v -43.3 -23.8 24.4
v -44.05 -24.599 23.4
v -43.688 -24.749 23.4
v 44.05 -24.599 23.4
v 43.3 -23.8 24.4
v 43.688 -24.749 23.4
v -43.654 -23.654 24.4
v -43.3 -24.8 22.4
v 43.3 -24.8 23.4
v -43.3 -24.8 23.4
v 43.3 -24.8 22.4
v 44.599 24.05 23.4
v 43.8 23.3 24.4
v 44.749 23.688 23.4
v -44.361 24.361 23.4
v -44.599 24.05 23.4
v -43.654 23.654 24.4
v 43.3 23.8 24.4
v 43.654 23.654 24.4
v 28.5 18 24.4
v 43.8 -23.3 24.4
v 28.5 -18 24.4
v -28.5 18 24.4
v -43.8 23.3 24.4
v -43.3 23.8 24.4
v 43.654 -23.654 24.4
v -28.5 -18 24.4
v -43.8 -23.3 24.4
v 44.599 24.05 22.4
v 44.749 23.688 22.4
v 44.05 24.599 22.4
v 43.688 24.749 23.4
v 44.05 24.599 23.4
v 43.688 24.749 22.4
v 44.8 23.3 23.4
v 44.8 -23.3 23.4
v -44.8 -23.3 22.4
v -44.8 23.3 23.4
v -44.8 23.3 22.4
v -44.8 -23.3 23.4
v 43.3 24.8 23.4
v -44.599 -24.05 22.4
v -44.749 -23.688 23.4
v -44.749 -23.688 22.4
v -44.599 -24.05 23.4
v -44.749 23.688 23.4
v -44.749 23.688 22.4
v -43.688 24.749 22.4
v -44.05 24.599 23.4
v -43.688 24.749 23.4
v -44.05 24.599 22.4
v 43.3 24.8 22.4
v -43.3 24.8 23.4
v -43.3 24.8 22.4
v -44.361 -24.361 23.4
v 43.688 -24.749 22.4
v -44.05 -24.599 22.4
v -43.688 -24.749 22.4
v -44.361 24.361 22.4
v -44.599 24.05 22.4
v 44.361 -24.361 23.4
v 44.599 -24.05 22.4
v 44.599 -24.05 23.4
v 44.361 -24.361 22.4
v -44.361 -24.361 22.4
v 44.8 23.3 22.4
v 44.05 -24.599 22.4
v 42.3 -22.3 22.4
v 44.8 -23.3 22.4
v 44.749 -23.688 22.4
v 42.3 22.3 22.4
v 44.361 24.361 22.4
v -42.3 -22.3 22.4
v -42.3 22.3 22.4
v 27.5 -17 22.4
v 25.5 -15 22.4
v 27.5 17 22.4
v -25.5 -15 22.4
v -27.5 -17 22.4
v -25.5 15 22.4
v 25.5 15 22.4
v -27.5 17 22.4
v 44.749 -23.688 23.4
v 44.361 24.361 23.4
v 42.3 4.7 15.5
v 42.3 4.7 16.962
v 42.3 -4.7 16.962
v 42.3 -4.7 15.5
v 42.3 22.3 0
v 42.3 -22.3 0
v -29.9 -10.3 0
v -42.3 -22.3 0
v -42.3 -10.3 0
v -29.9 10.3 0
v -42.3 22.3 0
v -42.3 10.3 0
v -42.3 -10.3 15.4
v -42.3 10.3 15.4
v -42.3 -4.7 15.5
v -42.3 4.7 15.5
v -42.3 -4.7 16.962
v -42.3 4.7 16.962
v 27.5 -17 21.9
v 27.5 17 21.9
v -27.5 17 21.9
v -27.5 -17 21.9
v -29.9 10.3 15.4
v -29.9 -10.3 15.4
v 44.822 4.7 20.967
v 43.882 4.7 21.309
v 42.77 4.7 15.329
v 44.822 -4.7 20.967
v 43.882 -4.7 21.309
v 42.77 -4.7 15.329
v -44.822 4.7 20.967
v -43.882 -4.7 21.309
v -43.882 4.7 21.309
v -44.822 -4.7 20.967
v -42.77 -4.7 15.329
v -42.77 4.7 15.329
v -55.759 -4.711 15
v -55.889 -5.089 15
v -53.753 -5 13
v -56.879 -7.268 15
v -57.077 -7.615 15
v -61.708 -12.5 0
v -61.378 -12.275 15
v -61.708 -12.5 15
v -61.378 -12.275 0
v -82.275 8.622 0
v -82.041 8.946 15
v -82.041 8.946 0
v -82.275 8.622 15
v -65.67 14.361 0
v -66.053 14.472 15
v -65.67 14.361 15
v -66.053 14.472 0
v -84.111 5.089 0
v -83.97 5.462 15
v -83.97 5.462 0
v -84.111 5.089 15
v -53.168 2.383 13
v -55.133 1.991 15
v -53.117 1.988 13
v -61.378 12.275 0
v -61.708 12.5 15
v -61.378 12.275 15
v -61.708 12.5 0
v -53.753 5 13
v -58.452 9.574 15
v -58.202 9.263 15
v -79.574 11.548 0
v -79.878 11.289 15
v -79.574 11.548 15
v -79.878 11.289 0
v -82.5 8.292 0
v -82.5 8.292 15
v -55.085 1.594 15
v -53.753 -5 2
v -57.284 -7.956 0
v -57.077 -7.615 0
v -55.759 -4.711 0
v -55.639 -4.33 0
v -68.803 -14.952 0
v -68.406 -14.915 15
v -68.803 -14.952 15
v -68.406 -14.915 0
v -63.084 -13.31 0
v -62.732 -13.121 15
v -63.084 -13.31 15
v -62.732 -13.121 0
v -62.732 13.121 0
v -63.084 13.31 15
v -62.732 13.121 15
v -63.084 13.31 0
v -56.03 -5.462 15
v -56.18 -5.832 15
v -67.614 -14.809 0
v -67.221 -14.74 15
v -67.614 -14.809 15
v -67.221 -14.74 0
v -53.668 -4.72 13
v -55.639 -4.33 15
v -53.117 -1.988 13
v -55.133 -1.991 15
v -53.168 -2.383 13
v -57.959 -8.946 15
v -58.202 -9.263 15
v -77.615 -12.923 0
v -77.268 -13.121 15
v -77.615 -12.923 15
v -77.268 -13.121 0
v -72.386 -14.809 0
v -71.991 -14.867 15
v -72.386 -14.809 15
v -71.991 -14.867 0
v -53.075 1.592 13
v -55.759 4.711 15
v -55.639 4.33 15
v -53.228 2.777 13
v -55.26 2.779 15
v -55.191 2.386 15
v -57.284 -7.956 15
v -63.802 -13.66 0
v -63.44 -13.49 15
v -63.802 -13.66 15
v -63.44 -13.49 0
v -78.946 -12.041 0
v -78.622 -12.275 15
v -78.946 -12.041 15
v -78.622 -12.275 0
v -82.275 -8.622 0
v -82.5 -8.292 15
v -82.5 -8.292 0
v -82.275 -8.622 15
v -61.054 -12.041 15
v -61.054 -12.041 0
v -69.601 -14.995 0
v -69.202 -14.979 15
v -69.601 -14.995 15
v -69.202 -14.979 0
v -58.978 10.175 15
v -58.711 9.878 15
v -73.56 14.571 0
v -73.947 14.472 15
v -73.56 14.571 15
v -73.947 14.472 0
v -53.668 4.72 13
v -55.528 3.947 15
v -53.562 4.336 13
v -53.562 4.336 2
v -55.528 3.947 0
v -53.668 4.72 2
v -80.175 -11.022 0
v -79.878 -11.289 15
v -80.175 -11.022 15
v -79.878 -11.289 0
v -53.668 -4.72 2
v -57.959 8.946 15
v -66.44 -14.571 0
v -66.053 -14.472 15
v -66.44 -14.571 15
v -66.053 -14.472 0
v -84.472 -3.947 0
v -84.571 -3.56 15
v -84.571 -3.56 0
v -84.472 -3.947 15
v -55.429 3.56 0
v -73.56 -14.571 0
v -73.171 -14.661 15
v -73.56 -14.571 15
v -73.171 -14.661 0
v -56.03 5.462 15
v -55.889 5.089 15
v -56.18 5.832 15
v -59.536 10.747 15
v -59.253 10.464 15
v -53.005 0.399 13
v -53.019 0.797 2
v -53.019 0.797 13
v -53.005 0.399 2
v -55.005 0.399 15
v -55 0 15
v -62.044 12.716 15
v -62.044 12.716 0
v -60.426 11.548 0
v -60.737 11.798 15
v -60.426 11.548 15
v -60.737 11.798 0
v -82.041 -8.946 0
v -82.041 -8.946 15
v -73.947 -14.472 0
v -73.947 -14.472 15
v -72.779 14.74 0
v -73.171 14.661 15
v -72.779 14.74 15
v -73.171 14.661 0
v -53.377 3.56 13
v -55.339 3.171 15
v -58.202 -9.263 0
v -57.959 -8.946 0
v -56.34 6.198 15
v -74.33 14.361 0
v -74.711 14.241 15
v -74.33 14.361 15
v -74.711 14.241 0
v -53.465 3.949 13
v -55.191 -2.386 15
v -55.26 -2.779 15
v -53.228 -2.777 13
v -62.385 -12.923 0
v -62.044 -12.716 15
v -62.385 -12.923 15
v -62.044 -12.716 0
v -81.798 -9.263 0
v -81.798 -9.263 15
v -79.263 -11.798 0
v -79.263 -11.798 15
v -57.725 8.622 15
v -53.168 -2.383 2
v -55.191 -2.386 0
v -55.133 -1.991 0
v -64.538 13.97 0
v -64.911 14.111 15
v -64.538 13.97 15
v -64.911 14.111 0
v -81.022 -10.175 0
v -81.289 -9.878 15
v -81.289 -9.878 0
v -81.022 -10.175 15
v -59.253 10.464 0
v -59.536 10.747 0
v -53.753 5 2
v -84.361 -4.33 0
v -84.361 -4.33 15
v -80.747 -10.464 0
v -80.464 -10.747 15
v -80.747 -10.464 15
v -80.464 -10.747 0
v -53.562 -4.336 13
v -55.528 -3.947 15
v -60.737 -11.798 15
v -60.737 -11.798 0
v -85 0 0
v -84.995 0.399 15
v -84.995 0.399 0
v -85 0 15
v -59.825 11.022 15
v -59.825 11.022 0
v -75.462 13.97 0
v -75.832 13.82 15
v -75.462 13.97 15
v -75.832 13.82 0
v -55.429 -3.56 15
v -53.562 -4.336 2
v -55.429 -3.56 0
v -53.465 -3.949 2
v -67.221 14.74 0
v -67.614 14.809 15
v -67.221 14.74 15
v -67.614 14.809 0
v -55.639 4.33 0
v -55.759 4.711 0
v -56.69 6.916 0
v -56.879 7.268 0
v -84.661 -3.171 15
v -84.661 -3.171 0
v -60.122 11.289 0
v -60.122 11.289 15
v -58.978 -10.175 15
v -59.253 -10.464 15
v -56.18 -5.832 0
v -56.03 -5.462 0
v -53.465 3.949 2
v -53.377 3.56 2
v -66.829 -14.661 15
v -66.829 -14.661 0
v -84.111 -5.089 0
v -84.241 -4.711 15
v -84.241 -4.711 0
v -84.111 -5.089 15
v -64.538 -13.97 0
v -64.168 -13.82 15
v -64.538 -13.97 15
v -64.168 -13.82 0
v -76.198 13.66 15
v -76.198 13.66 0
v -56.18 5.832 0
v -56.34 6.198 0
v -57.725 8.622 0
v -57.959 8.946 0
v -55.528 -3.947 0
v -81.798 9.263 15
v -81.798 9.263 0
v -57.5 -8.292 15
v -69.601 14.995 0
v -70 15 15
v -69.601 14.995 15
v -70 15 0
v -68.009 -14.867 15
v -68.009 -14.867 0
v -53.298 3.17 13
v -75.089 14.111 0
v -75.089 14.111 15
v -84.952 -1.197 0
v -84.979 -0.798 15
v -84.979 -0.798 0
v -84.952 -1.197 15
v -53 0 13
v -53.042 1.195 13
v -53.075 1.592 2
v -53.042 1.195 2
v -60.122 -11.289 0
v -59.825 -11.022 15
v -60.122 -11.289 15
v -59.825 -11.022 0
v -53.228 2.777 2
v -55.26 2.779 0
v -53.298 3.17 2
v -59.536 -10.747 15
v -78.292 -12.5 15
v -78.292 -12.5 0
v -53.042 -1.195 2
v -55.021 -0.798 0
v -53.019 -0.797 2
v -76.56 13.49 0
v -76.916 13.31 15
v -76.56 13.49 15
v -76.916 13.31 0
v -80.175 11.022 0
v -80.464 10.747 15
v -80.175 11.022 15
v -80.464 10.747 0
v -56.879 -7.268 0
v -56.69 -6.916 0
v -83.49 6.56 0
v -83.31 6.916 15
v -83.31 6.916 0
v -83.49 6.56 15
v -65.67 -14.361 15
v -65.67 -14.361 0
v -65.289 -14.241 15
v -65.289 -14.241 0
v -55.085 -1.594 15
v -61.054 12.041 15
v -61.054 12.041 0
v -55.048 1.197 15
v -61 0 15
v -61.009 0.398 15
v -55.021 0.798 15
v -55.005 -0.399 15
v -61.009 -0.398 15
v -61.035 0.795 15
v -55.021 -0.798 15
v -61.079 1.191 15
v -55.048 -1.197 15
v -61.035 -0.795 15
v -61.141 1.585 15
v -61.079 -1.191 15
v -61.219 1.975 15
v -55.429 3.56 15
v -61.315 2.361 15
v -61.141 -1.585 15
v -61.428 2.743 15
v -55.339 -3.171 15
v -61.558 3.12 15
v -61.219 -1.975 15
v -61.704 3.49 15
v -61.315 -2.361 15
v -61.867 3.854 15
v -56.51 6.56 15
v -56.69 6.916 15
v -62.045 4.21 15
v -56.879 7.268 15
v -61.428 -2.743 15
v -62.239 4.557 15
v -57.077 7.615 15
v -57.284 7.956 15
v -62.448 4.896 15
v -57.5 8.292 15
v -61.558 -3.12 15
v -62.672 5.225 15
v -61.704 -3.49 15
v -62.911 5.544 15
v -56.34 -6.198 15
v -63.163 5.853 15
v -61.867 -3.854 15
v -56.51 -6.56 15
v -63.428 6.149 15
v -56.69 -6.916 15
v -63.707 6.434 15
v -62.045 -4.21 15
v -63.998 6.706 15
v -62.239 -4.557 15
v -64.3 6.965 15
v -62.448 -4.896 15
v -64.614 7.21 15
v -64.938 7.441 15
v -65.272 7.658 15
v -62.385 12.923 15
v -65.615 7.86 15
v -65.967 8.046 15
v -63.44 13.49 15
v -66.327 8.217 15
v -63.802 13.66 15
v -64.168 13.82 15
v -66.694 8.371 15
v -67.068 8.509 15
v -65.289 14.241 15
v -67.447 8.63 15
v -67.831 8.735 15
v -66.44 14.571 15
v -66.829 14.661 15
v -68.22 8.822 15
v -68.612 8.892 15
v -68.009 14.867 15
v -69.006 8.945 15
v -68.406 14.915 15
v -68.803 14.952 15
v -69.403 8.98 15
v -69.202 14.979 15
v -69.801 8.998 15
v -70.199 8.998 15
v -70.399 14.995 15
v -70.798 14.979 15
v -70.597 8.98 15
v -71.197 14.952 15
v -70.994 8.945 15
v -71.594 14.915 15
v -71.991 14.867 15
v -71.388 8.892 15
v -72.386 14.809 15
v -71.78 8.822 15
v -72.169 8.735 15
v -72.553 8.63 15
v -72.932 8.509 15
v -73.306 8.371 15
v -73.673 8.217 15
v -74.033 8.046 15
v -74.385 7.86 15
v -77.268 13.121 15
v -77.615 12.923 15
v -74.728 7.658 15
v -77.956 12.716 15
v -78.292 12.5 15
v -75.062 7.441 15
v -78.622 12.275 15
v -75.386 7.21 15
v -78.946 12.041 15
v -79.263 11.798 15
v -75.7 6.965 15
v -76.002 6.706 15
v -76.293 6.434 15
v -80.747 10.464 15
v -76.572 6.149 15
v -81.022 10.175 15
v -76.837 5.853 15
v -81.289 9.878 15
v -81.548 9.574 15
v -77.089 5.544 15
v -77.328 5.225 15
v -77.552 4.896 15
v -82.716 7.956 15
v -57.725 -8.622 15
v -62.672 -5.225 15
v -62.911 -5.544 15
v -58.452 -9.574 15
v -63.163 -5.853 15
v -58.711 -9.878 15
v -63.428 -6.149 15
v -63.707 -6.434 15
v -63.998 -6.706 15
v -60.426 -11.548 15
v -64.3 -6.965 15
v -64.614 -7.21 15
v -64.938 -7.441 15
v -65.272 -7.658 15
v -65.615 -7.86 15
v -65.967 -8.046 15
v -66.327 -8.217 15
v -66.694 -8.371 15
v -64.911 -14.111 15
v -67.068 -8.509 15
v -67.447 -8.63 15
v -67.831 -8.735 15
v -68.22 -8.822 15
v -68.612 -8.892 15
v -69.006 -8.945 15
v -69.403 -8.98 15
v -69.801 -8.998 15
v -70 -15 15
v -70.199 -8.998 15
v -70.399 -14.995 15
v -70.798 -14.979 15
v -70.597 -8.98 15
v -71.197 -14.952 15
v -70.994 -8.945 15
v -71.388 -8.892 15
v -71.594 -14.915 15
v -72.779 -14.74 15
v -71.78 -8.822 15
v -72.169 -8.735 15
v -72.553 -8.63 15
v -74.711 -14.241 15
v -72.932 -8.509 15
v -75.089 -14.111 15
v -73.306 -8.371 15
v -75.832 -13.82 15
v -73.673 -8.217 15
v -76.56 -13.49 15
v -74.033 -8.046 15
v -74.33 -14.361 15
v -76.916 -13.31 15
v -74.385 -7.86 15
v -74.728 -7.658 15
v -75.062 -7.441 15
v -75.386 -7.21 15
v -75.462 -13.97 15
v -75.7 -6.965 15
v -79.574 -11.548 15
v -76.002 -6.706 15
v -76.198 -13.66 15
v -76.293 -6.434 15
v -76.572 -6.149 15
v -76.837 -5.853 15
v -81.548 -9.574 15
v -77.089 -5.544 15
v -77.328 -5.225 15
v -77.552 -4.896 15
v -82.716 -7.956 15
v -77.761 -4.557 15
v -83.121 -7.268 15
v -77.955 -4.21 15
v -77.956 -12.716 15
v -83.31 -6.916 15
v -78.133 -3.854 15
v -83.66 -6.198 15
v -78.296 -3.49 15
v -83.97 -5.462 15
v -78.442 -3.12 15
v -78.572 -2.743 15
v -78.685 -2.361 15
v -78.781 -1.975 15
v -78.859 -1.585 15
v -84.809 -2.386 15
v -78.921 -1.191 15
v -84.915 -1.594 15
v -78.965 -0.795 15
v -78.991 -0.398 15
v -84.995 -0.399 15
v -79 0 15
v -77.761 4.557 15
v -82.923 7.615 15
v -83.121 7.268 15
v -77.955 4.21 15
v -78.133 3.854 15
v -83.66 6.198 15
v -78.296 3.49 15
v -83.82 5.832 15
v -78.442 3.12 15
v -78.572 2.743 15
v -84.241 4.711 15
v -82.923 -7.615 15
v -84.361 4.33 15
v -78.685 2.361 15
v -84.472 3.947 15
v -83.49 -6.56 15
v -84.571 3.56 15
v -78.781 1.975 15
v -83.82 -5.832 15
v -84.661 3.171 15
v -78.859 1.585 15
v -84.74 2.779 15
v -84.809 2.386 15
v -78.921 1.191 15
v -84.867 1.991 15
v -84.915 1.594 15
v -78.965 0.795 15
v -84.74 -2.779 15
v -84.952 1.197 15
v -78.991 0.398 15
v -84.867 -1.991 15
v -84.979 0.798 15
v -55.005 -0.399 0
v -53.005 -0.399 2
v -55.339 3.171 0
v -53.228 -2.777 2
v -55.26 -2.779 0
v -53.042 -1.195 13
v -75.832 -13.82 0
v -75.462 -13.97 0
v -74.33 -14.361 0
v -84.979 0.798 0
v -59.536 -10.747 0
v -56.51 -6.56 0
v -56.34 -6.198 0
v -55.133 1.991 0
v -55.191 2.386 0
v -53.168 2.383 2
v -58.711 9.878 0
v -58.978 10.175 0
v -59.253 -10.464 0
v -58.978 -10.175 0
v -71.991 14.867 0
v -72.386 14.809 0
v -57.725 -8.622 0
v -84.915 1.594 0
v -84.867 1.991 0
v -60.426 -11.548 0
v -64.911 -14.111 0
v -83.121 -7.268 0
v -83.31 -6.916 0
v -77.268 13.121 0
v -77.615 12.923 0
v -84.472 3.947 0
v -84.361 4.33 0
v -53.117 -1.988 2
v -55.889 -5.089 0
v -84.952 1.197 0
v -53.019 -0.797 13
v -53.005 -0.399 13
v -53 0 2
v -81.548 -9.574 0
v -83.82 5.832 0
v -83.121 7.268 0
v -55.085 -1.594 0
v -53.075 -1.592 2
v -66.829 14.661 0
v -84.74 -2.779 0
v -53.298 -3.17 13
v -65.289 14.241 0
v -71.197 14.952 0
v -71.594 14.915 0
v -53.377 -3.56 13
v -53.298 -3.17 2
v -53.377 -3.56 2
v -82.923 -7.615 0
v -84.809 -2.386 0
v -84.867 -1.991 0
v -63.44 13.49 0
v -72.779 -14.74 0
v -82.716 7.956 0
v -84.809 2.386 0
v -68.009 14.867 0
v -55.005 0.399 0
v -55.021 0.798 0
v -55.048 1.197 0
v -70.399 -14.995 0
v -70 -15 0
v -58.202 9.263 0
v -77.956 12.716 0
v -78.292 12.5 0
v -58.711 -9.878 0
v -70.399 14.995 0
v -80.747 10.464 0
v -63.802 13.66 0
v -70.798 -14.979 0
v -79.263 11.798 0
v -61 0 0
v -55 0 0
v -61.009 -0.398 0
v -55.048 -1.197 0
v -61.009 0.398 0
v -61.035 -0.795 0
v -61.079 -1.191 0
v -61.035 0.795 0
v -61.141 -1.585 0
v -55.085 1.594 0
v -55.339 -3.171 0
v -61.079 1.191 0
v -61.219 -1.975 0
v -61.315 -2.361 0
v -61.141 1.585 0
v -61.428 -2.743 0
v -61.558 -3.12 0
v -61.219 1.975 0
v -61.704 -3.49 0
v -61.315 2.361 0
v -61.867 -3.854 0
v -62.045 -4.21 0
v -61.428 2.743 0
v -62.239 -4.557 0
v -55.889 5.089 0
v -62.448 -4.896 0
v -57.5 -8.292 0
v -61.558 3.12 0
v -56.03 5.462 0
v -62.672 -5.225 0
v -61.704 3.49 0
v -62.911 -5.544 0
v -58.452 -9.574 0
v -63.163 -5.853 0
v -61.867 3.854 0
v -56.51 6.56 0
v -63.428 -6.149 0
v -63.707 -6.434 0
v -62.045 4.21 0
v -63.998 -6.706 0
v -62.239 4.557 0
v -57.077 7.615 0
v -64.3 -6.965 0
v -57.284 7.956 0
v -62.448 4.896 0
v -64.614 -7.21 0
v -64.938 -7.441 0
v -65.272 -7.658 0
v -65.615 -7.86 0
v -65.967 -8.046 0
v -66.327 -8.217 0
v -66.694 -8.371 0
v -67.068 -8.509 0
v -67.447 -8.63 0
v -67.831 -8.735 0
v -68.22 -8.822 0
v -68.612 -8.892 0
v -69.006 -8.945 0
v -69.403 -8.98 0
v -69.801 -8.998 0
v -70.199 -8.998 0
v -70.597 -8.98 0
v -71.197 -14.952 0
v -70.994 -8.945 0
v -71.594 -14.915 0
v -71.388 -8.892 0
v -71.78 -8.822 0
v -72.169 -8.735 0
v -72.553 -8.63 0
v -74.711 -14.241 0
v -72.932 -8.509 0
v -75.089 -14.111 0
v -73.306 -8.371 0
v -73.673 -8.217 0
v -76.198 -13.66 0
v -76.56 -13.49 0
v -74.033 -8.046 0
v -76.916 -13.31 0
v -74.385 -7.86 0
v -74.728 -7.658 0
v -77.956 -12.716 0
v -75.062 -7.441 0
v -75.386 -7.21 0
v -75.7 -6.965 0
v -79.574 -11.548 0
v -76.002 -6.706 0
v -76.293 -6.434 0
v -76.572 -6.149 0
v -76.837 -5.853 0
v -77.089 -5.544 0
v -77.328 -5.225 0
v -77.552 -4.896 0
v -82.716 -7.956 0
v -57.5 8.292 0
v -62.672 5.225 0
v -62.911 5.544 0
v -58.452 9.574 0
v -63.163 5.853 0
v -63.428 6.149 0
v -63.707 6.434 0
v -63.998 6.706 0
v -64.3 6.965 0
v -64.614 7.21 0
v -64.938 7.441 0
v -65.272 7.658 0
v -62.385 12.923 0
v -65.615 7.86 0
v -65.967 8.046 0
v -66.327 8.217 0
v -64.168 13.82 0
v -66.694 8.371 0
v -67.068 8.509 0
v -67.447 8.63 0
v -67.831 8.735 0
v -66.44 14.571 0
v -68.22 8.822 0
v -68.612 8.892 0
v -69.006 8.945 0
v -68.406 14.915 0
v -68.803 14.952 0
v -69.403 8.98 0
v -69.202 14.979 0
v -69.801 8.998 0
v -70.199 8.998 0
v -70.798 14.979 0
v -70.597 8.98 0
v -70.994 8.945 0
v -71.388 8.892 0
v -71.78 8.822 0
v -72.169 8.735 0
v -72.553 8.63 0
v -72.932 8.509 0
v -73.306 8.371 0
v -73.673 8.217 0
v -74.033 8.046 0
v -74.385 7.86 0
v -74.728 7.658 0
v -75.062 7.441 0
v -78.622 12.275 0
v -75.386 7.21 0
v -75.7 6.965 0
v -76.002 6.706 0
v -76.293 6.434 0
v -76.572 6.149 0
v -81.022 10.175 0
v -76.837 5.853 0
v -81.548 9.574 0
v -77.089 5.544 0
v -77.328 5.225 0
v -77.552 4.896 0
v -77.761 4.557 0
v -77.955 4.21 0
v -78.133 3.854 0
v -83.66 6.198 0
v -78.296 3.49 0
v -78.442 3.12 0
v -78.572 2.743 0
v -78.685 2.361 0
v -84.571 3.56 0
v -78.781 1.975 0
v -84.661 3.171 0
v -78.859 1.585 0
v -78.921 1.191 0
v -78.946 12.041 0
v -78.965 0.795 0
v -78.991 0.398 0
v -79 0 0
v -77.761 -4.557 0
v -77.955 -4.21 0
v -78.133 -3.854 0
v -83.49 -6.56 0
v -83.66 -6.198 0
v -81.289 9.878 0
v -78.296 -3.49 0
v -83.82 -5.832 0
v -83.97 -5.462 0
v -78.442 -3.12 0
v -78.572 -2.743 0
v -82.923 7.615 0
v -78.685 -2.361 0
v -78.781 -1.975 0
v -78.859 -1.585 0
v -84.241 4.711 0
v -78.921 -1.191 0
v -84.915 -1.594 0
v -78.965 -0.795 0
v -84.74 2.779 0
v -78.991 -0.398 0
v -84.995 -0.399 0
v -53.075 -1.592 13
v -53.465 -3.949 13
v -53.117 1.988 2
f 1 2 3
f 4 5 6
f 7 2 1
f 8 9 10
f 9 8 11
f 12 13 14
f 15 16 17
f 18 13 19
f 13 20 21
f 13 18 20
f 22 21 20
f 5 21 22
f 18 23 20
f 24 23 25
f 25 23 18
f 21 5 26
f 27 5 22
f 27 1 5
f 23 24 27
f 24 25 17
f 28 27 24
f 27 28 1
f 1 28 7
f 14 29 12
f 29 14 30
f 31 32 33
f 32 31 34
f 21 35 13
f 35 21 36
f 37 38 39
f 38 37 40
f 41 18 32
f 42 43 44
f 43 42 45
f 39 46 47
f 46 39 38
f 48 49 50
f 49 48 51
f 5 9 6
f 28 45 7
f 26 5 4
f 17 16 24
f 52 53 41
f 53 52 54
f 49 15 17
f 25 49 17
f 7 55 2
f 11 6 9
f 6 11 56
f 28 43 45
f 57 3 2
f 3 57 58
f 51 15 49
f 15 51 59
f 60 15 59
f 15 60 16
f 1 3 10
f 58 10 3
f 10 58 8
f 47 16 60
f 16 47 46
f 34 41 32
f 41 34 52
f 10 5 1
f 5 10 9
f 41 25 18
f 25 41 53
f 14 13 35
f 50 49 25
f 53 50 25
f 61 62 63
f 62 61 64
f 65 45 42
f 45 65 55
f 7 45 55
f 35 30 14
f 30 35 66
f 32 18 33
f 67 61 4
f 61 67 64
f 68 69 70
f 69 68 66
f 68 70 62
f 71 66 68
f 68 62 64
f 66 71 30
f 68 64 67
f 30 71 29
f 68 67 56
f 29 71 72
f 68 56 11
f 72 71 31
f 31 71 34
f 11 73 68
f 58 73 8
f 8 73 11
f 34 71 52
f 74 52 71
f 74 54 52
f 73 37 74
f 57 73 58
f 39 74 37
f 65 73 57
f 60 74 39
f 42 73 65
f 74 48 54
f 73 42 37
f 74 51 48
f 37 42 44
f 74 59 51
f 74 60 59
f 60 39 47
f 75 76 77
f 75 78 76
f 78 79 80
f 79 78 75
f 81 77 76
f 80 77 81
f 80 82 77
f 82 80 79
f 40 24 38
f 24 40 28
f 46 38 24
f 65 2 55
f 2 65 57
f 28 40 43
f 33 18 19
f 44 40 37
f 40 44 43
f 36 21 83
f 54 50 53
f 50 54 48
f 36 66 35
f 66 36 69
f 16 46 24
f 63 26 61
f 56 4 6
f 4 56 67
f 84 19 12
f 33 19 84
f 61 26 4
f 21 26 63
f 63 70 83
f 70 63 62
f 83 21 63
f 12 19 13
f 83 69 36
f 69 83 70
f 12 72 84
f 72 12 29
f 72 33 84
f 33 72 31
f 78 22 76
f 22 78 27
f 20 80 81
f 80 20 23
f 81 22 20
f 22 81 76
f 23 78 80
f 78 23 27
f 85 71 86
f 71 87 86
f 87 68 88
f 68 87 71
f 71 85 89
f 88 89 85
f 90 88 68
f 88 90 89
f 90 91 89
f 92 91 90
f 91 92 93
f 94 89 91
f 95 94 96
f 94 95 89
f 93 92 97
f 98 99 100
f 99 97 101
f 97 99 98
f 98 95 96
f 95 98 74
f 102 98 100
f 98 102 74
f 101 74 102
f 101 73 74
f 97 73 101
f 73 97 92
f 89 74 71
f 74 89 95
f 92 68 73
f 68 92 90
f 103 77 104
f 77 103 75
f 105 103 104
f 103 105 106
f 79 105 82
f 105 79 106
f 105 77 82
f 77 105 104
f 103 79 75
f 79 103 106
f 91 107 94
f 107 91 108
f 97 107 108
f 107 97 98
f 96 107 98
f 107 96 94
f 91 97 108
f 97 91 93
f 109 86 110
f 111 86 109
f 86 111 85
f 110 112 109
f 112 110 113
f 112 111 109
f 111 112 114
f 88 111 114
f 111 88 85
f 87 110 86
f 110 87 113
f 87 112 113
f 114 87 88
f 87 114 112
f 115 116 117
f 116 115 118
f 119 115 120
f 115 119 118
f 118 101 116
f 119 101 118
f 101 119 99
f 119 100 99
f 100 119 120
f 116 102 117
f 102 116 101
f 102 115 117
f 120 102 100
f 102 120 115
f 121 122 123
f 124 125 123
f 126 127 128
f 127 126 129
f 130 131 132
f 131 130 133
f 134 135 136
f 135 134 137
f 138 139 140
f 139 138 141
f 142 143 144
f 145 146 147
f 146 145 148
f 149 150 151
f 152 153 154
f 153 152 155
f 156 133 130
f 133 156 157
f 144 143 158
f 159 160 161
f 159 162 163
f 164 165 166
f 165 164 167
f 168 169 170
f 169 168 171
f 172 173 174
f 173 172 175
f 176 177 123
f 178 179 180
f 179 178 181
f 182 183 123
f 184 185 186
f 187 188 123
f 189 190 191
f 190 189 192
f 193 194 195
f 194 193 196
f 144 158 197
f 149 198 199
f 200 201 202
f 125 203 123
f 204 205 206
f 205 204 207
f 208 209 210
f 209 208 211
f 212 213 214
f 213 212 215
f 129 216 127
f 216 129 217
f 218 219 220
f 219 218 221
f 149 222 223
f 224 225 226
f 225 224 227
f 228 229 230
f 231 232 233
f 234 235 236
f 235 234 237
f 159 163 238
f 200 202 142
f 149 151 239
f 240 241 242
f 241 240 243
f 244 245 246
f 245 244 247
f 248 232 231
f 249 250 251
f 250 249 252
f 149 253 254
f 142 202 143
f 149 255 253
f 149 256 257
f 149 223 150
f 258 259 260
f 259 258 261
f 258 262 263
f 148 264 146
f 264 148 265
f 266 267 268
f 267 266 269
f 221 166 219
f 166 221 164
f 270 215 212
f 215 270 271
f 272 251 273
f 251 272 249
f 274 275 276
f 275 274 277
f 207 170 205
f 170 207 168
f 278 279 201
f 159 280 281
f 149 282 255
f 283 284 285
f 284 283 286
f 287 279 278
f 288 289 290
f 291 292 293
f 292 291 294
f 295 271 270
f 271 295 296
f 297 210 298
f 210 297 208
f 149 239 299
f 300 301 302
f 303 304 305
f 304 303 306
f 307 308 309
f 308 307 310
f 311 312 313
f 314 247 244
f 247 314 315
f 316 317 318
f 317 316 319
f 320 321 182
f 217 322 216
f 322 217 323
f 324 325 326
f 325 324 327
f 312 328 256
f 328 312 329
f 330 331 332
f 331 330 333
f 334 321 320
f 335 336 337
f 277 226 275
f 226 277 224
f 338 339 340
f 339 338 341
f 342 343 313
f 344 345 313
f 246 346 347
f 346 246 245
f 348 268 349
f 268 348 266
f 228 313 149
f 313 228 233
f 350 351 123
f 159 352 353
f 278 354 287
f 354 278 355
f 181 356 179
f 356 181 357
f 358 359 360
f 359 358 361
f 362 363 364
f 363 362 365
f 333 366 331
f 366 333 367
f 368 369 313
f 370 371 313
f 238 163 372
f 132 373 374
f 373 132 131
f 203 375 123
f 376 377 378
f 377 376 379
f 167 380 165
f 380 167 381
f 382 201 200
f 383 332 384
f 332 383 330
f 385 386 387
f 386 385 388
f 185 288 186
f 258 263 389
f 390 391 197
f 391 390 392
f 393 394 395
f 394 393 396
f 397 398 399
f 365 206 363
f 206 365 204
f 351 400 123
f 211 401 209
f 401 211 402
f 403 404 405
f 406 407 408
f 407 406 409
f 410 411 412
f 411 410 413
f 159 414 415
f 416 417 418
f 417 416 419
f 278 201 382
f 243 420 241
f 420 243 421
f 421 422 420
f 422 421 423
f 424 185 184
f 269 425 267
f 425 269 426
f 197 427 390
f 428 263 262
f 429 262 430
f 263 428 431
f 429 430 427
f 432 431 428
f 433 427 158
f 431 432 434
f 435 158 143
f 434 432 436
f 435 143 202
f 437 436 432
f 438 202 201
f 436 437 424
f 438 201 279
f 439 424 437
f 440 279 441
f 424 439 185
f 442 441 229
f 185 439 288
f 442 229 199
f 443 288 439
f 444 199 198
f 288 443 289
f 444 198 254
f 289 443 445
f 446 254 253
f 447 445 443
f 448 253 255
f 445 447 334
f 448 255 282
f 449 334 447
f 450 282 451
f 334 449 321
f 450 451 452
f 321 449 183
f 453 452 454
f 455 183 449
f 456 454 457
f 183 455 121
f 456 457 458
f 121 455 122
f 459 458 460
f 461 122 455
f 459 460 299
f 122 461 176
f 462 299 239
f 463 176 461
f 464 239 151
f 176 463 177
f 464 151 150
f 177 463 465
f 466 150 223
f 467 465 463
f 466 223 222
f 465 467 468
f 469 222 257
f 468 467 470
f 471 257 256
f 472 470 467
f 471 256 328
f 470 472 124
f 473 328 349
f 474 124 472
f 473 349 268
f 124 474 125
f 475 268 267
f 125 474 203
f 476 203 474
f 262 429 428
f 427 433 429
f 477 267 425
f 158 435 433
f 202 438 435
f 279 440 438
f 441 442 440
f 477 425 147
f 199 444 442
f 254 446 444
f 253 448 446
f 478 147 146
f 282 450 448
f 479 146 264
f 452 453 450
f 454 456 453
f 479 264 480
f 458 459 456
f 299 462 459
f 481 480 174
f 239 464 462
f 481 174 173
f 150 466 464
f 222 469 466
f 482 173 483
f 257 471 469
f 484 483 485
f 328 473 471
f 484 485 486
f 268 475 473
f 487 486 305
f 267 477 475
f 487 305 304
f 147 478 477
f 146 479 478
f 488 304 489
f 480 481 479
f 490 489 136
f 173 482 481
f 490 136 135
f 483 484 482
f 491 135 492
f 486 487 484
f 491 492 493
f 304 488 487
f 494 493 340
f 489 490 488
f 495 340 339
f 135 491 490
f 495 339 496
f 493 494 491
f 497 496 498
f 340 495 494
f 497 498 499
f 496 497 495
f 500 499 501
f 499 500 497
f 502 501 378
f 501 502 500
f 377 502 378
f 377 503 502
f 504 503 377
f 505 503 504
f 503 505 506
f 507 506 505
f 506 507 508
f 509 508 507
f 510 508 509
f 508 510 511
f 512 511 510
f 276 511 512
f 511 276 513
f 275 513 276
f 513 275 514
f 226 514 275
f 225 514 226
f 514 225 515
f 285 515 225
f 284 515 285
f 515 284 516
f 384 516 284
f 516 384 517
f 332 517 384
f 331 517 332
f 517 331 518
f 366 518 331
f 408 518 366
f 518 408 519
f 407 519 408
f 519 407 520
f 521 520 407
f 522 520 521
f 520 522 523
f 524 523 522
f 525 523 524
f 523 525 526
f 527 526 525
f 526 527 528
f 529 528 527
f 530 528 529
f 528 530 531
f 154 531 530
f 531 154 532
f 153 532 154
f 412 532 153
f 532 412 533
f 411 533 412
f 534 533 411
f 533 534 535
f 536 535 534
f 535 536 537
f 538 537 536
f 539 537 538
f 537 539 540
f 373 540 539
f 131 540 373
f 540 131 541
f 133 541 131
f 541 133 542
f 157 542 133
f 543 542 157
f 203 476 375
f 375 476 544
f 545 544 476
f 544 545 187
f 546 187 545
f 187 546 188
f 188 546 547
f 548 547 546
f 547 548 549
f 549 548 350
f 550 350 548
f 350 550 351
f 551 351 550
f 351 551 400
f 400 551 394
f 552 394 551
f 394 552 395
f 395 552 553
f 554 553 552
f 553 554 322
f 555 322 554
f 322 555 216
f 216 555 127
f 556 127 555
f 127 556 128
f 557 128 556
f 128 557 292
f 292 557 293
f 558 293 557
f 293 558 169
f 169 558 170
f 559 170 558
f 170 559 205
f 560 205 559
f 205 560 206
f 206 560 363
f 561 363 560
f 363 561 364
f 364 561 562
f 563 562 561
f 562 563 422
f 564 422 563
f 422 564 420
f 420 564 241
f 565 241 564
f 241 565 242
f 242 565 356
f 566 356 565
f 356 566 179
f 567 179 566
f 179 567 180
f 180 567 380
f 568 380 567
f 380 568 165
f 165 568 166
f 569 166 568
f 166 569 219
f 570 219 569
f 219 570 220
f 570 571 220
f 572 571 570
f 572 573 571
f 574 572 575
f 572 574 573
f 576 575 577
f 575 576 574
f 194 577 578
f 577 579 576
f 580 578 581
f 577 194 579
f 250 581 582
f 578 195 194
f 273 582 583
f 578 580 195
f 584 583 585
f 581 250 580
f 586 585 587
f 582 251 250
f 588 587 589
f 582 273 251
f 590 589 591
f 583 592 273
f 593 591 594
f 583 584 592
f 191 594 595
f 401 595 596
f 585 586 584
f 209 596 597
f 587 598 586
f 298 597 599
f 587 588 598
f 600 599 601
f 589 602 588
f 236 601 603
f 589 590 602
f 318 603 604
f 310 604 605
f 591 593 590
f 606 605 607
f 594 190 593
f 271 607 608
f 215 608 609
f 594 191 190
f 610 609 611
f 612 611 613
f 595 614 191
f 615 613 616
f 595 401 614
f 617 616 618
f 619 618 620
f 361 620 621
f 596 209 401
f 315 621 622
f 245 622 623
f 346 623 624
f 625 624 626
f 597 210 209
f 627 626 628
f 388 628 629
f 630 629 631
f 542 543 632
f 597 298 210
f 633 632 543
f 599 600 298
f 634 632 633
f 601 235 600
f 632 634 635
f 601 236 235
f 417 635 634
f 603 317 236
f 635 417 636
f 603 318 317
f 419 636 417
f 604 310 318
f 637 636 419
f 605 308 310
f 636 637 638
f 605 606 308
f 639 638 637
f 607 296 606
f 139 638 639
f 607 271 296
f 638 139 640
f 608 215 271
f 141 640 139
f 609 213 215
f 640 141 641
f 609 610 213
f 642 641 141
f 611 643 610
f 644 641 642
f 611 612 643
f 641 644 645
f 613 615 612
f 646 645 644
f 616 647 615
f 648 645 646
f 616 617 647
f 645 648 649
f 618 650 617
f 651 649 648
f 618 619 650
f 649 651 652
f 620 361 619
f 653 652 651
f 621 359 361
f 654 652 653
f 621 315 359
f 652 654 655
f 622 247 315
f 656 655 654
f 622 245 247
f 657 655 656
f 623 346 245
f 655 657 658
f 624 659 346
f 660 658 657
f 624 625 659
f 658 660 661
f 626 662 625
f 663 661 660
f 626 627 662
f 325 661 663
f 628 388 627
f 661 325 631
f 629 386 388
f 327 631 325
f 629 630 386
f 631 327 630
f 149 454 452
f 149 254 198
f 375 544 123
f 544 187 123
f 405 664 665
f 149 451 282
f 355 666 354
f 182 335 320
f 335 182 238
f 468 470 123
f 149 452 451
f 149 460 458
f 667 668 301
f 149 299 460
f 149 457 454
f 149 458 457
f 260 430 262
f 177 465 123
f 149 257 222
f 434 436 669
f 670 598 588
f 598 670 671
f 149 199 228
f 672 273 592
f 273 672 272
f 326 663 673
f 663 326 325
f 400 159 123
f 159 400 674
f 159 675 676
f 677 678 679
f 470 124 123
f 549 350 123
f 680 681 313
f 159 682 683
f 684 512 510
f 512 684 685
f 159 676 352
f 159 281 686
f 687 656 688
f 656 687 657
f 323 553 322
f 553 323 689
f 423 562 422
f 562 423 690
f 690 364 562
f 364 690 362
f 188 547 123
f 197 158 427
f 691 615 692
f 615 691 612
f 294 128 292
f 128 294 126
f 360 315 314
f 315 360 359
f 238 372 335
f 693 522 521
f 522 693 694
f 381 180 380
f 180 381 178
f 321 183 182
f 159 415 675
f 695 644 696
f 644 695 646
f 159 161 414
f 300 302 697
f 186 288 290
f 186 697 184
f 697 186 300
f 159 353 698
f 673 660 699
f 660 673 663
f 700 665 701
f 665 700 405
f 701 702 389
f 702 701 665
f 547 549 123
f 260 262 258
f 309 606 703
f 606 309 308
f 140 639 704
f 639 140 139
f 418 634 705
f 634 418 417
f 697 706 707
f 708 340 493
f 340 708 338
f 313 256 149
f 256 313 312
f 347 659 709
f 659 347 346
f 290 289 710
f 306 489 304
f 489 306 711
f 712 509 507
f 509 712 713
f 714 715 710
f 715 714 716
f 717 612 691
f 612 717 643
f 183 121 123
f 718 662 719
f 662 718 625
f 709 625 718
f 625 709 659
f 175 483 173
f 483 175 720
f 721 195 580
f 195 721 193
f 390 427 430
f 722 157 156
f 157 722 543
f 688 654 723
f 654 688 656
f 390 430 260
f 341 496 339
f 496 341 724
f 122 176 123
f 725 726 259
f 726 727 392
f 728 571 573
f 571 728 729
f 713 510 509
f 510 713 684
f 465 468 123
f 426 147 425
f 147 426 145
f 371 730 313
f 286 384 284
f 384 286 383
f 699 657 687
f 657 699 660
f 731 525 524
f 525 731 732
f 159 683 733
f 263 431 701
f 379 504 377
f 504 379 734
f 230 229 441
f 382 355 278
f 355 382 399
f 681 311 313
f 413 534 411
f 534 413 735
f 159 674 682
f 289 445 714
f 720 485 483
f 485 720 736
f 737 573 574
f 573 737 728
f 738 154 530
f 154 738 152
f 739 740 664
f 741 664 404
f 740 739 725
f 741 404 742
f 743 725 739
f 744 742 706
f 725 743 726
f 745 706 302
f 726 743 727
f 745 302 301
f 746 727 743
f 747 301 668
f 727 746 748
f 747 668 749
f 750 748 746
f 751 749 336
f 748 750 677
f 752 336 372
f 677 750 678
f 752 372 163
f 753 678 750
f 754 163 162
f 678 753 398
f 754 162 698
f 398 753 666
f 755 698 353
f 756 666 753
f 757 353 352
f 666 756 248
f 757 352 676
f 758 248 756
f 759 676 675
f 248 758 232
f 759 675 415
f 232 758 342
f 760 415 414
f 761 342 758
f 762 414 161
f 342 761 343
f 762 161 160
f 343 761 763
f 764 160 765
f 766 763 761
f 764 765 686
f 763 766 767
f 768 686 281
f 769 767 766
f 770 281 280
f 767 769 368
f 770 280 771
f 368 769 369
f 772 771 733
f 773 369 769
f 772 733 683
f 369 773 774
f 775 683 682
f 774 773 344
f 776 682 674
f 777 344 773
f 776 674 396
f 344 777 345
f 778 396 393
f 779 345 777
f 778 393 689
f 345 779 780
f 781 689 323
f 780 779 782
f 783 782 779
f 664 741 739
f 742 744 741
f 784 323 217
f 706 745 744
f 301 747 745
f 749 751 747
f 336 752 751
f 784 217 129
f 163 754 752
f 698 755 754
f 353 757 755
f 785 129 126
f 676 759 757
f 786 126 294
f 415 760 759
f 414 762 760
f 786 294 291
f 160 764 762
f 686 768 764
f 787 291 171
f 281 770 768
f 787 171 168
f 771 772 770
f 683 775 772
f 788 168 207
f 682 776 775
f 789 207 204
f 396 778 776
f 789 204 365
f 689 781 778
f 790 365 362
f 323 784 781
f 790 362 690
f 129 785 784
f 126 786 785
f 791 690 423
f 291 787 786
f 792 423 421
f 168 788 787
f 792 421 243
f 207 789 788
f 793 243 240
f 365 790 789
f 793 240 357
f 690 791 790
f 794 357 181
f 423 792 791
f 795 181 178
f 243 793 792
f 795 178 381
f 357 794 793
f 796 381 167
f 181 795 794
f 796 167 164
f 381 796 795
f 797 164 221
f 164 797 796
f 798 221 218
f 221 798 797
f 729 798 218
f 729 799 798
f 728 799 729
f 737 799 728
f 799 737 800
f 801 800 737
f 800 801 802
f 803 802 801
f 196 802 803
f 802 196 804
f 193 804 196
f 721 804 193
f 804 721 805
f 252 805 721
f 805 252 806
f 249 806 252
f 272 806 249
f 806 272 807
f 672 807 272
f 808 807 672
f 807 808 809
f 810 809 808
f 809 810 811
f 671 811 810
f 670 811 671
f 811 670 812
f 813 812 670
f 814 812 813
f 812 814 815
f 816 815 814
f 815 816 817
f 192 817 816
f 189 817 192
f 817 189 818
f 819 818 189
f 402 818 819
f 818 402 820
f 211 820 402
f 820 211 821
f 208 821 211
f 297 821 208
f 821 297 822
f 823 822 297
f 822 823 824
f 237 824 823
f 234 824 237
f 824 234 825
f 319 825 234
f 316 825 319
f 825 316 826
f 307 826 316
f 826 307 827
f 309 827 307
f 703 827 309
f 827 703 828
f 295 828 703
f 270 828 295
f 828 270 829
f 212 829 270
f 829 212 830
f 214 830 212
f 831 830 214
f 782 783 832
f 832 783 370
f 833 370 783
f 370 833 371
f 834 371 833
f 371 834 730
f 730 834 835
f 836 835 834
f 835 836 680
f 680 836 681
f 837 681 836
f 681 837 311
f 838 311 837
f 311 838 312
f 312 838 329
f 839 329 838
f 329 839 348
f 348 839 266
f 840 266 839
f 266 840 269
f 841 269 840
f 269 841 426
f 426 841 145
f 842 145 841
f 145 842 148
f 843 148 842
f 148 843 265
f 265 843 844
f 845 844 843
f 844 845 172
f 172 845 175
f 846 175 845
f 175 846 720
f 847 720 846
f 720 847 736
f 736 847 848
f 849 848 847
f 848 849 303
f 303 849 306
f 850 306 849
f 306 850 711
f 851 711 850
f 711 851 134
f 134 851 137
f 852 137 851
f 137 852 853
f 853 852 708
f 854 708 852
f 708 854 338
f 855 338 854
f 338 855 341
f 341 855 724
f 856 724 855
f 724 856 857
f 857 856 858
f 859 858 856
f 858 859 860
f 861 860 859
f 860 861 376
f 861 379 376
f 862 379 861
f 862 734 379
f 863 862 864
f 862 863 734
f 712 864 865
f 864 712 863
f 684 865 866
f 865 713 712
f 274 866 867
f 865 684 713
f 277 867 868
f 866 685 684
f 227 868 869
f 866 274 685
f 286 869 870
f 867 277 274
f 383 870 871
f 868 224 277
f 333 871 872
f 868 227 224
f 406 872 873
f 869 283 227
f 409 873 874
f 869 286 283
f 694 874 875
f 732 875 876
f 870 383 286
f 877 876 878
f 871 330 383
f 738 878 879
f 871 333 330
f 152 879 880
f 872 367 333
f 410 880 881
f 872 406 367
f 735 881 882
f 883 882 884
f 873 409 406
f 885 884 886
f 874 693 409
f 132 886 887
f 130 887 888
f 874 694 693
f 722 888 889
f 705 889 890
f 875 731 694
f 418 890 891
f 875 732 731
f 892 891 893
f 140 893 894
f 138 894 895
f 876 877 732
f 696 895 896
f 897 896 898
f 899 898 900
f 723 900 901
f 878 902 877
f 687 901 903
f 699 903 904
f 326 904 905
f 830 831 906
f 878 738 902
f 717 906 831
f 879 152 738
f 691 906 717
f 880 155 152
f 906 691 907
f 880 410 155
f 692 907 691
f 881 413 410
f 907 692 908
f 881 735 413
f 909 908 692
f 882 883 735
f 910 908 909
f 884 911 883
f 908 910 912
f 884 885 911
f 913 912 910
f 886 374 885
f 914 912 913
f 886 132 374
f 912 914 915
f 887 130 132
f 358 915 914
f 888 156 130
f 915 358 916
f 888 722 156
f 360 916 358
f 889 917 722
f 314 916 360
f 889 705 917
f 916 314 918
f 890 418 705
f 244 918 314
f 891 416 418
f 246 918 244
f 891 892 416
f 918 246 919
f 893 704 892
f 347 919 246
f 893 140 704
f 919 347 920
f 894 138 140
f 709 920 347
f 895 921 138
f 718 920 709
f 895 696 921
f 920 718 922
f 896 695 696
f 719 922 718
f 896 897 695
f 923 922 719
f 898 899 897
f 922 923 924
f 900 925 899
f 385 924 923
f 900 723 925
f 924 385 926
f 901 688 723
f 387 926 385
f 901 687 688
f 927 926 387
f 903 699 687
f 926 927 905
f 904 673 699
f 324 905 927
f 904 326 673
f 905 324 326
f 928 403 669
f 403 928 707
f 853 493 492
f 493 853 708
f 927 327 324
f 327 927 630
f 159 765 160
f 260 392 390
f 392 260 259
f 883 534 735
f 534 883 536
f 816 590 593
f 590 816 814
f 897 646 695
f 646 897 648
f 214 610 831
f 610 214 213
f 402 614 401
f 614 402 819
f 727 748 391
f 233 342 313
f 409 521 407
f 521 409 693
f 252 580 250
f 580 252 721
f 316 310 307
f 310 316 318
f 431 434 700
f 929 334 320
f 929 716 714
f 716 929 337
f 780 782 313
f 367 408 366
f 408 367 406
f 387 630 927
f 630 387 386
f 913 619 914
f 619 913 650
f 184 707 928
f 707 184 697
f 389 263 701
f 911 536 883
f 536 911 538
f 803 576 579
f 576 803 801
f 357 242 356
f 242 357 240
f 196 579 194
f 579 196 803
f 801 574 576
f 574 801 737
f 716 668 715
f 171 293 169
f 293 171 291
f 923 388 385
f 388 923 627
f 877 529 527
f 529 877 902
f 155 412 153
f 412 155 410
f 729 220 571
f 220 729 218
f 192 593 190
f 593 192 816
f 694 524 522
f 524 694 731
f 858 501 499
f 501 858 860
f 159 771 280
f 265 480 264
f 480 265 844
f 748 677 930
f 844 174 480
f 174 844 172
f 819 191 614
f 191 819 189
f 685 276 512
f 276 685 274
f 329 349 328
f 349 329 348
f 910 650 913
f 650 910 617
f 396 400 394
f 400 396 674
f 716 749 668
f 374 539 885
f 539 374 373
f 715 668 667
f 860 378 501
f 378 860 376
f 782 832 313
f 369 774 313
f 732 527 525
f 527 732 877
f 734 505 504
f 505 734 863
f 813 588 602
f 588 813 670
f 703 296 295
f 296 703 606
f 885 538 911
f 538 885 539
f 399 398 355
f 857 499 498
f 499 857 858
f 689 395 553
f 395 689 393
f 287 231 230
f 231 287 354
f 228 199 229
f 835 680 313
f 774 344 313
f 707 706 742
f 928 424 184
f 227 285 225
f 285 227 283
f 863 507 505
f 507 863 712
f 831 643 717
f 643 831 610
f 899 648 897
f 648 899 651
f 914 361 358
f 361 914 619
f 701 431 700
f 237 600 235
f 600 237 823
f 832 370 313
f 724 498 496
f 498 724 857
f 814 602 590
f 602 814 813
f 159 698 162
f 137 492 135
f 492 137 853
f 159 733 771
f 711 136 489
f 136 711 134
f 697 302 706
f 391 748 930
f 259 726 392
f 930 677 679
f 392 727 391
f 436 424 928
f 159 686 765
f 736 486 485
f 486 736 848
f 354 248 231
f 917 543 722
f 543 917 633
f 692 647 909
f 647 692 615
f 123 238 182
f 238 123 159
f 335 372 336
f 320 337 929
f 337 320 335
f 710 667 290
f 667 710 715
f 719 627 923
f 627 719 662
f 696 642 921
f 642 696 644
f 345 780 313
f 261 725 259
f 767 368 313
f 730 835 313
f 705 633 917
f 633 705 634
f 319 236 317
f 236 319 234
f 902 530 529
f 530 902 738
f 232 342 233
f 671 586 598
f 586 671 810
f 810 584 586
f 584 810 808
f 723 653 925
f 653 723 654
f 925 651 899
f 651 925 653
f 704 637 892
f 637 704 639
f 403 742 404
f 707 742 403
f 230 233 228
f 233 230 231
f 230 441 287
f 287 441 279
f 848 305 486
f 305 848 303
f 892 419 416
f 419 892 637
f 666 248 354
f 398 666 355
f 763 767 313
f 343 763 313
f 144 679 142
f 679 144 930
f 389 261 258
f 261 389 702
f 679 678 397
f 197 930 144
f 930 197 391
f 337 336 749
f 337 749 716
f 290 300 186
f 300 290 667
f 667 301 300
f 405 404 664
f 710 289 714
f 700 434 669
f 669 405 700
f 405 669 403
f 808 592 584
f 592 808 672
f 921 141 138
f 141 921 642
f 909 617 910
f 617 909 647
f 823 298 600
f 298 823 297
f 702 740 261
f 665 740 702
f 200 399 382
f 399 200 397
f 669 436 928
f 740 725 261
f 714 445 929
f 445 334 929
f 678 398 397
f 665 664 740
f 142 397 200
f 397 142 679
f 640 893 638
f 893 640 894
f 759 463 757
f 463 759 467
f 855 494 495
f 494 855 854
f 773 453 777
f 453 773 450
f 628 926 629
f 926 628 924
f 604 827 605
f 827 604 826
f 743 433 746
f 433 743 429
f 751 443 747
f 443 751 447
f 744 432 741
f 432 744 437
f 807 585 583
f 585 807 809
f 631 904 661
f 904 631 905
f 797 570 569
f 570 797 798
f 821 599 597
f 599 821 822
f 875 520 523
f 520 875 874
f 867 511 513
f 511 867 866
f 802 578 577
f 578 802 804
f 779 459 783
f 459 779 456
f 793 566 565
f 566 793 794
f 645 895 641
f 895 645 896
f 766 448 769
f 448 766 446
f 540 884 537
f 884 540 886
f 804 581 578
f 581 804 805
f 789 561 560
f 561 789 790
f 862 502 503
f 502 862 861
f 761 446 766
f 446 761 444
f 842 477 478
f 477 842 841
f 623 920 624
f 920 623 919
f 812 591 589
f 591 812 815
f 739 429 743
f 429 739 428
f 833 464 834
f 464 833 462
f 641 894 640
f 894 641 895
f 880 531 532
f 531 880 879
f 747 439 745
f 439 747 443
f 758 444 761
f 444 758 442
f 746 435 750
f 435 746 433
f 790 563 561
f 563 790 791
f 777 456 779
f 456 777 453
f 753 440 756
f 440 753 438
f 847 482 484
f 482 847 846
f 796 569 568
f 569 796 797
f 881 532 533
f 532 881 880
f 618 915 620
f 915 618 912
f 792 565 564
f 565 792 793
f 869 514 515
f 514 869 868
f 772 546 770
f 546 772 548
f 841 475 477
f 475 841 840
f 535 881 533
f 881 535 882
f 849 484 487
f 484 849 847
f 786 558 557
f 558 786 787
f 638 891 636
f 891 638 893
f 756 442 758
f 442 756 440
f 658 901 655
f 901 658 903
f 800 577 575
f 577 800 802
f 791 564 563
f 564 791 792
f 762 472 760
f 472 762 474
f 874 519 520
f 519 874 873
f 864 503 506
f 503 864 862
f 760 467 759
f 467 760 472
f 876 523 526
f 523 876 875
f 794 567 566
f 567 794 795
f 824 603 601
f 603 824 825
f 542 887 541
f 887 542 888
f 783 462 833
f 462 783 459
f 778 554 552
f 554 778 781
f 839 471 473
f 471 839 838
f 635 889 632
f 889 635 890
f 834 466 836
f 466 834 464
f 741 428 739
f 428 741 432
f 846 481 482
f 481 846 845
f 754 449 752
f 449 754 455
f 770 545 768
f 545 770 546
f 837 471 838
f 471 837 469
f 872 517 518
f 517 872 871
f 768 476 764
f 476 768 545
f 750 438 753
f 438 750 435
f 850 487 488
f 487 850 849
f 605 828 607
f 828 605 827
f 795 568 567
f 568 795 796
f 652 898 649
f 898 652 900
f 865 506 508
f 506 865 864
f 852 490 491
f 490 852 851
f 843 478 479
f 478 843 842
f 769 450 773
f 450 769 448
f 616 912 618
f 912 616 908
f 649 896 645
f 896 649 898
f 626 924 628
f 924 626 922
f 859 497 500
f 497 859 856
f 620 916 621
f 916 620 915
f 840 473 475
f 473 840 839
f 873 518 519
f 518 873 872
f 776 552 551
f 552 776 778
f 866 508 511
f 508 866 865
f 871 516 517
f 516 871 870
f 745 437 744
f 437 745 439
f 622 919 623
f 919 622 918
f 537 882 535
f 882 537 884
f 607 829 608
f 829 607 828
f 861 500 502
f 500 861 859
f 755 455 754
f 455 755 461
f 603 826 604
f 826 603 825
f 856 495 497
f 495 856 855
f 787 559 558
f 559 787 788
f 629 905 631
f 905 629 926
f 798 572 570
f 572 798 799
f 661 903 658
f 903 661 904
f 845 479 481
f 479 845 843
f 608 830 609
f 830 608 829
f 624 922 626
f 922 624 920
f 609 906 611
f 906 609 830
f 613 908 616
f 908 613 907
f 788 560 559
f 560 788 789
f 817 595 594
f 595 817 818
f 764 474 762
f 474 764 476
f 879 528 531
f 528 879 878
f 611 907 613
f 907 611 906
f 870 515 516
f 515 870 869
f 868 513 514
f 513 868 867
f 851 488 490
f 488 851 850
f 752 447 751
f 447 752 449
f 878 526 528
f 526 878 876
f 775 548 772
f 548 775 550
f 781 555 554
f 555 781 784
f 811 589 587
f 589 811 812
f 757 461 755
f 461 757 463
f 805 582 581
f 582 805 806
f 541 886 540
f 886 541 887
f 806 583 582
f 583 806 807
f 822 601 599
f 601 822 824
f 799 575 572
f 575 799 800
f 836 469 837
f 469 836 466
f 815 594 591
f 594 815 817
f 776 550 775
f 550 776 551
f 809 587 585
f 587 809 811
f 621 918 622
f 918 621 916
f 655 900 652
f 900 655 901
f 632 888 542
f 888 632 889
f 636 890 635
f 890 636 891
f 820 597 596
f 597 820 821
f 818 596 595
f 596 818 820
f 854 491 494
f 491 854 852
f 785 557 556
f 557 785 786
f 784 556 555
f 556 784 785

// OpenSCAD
$fa = 1;
$fs = 0.4;

meter_bounds_size = [89.6, 49.6, 24.4];
bezel_size = [meter_bounds_size.x, meter_bounds_size.y, 2];
meter_body_size = [84.6, 44.6, meter_bounds_size.z - 2];
sensor_bounds_size = [32, 30, 15];
screen_size = [51, 30];

module bezel() {
	r_bottom=1.5;
	r_top=0.5;

	module bottom() {
		linear_extrude(1)
		minkowski() {
			square([89.6 - 2 * r_bottom, 49.6 - 2 * r_bottom], center=true);
			circle(r=r_bottom);
		}
	}

	module top() {
		linear_extrude(1)
		minkowski() {
			square([89.6 - 2 * r_bottom, 49.6 - 2 * r_bottom], center=true);
			circle(r=r_top);
		}
	}

	module body() {
		hull() {
			bottom();
			translate([0, 0, 1]) top();
		}
	}

	module cutout() {
		hull() {
			translate([0, 0, -2])
				linear_extrude(1)
				square([51 - 6, 30 - 6], center=true);
			translate([0, 0, 4])
				linear_extrude(1)
				square([51 + 12, 30 + 12], center=true);
		}
	}

	difference() {
		body();
		cutout();
	}
}

module meter() {
	meter_body_size_overlapping = meter_body_size + [0, 0, bezel_size.z / 2];

	translate([0, 0, meter_body_size.z]) bezel();
	difference() {
		translate([0, 0, meter_body_size_overlapping.z / 2])
			cube(meter_body_size_overlapping, center=true);
		translate([0, 0, meter_body_size.z + bezel_size.z / 4])
			cube([screen_size.x + 4, screen_size.y + 4, bezel_size.z], center=true);
		translate([-meter_body_size.x / 2, 0, 0]) cube([24.8, 20.6, 30.8], center=true);
	}

	module tab() {
		translate([meter_body_size.x / 2, 0, 15.5])
			rotate([0, 20, 0])
			translate([0, 0, 3])
			cube([1, 9.4, 6], center=true);
	}

	tab();
	mirror([1, 0, 0]) tab();
}

module sensor() {
	r = sensor_bounds_size.y / 2;
	h = sensor_bounds_size.z;
	bulge_width = sensor_bounds_size.x - sensor_bounds_size.y;
	difference() {
		hull() {
			cylinder(r=r, h=h);
			intersection() {
				cylinder(r=r + bulge_width, h=h);
				translate([r, 0, h / 2]) cube([2 * bulge_width, 10, 11], center=true);
			}
		}
		translate([0, 0, -1]) cylinder(r=9, h=h + 2);
	}
}

meter();
translate([-70, 0, 0]) sensor();
